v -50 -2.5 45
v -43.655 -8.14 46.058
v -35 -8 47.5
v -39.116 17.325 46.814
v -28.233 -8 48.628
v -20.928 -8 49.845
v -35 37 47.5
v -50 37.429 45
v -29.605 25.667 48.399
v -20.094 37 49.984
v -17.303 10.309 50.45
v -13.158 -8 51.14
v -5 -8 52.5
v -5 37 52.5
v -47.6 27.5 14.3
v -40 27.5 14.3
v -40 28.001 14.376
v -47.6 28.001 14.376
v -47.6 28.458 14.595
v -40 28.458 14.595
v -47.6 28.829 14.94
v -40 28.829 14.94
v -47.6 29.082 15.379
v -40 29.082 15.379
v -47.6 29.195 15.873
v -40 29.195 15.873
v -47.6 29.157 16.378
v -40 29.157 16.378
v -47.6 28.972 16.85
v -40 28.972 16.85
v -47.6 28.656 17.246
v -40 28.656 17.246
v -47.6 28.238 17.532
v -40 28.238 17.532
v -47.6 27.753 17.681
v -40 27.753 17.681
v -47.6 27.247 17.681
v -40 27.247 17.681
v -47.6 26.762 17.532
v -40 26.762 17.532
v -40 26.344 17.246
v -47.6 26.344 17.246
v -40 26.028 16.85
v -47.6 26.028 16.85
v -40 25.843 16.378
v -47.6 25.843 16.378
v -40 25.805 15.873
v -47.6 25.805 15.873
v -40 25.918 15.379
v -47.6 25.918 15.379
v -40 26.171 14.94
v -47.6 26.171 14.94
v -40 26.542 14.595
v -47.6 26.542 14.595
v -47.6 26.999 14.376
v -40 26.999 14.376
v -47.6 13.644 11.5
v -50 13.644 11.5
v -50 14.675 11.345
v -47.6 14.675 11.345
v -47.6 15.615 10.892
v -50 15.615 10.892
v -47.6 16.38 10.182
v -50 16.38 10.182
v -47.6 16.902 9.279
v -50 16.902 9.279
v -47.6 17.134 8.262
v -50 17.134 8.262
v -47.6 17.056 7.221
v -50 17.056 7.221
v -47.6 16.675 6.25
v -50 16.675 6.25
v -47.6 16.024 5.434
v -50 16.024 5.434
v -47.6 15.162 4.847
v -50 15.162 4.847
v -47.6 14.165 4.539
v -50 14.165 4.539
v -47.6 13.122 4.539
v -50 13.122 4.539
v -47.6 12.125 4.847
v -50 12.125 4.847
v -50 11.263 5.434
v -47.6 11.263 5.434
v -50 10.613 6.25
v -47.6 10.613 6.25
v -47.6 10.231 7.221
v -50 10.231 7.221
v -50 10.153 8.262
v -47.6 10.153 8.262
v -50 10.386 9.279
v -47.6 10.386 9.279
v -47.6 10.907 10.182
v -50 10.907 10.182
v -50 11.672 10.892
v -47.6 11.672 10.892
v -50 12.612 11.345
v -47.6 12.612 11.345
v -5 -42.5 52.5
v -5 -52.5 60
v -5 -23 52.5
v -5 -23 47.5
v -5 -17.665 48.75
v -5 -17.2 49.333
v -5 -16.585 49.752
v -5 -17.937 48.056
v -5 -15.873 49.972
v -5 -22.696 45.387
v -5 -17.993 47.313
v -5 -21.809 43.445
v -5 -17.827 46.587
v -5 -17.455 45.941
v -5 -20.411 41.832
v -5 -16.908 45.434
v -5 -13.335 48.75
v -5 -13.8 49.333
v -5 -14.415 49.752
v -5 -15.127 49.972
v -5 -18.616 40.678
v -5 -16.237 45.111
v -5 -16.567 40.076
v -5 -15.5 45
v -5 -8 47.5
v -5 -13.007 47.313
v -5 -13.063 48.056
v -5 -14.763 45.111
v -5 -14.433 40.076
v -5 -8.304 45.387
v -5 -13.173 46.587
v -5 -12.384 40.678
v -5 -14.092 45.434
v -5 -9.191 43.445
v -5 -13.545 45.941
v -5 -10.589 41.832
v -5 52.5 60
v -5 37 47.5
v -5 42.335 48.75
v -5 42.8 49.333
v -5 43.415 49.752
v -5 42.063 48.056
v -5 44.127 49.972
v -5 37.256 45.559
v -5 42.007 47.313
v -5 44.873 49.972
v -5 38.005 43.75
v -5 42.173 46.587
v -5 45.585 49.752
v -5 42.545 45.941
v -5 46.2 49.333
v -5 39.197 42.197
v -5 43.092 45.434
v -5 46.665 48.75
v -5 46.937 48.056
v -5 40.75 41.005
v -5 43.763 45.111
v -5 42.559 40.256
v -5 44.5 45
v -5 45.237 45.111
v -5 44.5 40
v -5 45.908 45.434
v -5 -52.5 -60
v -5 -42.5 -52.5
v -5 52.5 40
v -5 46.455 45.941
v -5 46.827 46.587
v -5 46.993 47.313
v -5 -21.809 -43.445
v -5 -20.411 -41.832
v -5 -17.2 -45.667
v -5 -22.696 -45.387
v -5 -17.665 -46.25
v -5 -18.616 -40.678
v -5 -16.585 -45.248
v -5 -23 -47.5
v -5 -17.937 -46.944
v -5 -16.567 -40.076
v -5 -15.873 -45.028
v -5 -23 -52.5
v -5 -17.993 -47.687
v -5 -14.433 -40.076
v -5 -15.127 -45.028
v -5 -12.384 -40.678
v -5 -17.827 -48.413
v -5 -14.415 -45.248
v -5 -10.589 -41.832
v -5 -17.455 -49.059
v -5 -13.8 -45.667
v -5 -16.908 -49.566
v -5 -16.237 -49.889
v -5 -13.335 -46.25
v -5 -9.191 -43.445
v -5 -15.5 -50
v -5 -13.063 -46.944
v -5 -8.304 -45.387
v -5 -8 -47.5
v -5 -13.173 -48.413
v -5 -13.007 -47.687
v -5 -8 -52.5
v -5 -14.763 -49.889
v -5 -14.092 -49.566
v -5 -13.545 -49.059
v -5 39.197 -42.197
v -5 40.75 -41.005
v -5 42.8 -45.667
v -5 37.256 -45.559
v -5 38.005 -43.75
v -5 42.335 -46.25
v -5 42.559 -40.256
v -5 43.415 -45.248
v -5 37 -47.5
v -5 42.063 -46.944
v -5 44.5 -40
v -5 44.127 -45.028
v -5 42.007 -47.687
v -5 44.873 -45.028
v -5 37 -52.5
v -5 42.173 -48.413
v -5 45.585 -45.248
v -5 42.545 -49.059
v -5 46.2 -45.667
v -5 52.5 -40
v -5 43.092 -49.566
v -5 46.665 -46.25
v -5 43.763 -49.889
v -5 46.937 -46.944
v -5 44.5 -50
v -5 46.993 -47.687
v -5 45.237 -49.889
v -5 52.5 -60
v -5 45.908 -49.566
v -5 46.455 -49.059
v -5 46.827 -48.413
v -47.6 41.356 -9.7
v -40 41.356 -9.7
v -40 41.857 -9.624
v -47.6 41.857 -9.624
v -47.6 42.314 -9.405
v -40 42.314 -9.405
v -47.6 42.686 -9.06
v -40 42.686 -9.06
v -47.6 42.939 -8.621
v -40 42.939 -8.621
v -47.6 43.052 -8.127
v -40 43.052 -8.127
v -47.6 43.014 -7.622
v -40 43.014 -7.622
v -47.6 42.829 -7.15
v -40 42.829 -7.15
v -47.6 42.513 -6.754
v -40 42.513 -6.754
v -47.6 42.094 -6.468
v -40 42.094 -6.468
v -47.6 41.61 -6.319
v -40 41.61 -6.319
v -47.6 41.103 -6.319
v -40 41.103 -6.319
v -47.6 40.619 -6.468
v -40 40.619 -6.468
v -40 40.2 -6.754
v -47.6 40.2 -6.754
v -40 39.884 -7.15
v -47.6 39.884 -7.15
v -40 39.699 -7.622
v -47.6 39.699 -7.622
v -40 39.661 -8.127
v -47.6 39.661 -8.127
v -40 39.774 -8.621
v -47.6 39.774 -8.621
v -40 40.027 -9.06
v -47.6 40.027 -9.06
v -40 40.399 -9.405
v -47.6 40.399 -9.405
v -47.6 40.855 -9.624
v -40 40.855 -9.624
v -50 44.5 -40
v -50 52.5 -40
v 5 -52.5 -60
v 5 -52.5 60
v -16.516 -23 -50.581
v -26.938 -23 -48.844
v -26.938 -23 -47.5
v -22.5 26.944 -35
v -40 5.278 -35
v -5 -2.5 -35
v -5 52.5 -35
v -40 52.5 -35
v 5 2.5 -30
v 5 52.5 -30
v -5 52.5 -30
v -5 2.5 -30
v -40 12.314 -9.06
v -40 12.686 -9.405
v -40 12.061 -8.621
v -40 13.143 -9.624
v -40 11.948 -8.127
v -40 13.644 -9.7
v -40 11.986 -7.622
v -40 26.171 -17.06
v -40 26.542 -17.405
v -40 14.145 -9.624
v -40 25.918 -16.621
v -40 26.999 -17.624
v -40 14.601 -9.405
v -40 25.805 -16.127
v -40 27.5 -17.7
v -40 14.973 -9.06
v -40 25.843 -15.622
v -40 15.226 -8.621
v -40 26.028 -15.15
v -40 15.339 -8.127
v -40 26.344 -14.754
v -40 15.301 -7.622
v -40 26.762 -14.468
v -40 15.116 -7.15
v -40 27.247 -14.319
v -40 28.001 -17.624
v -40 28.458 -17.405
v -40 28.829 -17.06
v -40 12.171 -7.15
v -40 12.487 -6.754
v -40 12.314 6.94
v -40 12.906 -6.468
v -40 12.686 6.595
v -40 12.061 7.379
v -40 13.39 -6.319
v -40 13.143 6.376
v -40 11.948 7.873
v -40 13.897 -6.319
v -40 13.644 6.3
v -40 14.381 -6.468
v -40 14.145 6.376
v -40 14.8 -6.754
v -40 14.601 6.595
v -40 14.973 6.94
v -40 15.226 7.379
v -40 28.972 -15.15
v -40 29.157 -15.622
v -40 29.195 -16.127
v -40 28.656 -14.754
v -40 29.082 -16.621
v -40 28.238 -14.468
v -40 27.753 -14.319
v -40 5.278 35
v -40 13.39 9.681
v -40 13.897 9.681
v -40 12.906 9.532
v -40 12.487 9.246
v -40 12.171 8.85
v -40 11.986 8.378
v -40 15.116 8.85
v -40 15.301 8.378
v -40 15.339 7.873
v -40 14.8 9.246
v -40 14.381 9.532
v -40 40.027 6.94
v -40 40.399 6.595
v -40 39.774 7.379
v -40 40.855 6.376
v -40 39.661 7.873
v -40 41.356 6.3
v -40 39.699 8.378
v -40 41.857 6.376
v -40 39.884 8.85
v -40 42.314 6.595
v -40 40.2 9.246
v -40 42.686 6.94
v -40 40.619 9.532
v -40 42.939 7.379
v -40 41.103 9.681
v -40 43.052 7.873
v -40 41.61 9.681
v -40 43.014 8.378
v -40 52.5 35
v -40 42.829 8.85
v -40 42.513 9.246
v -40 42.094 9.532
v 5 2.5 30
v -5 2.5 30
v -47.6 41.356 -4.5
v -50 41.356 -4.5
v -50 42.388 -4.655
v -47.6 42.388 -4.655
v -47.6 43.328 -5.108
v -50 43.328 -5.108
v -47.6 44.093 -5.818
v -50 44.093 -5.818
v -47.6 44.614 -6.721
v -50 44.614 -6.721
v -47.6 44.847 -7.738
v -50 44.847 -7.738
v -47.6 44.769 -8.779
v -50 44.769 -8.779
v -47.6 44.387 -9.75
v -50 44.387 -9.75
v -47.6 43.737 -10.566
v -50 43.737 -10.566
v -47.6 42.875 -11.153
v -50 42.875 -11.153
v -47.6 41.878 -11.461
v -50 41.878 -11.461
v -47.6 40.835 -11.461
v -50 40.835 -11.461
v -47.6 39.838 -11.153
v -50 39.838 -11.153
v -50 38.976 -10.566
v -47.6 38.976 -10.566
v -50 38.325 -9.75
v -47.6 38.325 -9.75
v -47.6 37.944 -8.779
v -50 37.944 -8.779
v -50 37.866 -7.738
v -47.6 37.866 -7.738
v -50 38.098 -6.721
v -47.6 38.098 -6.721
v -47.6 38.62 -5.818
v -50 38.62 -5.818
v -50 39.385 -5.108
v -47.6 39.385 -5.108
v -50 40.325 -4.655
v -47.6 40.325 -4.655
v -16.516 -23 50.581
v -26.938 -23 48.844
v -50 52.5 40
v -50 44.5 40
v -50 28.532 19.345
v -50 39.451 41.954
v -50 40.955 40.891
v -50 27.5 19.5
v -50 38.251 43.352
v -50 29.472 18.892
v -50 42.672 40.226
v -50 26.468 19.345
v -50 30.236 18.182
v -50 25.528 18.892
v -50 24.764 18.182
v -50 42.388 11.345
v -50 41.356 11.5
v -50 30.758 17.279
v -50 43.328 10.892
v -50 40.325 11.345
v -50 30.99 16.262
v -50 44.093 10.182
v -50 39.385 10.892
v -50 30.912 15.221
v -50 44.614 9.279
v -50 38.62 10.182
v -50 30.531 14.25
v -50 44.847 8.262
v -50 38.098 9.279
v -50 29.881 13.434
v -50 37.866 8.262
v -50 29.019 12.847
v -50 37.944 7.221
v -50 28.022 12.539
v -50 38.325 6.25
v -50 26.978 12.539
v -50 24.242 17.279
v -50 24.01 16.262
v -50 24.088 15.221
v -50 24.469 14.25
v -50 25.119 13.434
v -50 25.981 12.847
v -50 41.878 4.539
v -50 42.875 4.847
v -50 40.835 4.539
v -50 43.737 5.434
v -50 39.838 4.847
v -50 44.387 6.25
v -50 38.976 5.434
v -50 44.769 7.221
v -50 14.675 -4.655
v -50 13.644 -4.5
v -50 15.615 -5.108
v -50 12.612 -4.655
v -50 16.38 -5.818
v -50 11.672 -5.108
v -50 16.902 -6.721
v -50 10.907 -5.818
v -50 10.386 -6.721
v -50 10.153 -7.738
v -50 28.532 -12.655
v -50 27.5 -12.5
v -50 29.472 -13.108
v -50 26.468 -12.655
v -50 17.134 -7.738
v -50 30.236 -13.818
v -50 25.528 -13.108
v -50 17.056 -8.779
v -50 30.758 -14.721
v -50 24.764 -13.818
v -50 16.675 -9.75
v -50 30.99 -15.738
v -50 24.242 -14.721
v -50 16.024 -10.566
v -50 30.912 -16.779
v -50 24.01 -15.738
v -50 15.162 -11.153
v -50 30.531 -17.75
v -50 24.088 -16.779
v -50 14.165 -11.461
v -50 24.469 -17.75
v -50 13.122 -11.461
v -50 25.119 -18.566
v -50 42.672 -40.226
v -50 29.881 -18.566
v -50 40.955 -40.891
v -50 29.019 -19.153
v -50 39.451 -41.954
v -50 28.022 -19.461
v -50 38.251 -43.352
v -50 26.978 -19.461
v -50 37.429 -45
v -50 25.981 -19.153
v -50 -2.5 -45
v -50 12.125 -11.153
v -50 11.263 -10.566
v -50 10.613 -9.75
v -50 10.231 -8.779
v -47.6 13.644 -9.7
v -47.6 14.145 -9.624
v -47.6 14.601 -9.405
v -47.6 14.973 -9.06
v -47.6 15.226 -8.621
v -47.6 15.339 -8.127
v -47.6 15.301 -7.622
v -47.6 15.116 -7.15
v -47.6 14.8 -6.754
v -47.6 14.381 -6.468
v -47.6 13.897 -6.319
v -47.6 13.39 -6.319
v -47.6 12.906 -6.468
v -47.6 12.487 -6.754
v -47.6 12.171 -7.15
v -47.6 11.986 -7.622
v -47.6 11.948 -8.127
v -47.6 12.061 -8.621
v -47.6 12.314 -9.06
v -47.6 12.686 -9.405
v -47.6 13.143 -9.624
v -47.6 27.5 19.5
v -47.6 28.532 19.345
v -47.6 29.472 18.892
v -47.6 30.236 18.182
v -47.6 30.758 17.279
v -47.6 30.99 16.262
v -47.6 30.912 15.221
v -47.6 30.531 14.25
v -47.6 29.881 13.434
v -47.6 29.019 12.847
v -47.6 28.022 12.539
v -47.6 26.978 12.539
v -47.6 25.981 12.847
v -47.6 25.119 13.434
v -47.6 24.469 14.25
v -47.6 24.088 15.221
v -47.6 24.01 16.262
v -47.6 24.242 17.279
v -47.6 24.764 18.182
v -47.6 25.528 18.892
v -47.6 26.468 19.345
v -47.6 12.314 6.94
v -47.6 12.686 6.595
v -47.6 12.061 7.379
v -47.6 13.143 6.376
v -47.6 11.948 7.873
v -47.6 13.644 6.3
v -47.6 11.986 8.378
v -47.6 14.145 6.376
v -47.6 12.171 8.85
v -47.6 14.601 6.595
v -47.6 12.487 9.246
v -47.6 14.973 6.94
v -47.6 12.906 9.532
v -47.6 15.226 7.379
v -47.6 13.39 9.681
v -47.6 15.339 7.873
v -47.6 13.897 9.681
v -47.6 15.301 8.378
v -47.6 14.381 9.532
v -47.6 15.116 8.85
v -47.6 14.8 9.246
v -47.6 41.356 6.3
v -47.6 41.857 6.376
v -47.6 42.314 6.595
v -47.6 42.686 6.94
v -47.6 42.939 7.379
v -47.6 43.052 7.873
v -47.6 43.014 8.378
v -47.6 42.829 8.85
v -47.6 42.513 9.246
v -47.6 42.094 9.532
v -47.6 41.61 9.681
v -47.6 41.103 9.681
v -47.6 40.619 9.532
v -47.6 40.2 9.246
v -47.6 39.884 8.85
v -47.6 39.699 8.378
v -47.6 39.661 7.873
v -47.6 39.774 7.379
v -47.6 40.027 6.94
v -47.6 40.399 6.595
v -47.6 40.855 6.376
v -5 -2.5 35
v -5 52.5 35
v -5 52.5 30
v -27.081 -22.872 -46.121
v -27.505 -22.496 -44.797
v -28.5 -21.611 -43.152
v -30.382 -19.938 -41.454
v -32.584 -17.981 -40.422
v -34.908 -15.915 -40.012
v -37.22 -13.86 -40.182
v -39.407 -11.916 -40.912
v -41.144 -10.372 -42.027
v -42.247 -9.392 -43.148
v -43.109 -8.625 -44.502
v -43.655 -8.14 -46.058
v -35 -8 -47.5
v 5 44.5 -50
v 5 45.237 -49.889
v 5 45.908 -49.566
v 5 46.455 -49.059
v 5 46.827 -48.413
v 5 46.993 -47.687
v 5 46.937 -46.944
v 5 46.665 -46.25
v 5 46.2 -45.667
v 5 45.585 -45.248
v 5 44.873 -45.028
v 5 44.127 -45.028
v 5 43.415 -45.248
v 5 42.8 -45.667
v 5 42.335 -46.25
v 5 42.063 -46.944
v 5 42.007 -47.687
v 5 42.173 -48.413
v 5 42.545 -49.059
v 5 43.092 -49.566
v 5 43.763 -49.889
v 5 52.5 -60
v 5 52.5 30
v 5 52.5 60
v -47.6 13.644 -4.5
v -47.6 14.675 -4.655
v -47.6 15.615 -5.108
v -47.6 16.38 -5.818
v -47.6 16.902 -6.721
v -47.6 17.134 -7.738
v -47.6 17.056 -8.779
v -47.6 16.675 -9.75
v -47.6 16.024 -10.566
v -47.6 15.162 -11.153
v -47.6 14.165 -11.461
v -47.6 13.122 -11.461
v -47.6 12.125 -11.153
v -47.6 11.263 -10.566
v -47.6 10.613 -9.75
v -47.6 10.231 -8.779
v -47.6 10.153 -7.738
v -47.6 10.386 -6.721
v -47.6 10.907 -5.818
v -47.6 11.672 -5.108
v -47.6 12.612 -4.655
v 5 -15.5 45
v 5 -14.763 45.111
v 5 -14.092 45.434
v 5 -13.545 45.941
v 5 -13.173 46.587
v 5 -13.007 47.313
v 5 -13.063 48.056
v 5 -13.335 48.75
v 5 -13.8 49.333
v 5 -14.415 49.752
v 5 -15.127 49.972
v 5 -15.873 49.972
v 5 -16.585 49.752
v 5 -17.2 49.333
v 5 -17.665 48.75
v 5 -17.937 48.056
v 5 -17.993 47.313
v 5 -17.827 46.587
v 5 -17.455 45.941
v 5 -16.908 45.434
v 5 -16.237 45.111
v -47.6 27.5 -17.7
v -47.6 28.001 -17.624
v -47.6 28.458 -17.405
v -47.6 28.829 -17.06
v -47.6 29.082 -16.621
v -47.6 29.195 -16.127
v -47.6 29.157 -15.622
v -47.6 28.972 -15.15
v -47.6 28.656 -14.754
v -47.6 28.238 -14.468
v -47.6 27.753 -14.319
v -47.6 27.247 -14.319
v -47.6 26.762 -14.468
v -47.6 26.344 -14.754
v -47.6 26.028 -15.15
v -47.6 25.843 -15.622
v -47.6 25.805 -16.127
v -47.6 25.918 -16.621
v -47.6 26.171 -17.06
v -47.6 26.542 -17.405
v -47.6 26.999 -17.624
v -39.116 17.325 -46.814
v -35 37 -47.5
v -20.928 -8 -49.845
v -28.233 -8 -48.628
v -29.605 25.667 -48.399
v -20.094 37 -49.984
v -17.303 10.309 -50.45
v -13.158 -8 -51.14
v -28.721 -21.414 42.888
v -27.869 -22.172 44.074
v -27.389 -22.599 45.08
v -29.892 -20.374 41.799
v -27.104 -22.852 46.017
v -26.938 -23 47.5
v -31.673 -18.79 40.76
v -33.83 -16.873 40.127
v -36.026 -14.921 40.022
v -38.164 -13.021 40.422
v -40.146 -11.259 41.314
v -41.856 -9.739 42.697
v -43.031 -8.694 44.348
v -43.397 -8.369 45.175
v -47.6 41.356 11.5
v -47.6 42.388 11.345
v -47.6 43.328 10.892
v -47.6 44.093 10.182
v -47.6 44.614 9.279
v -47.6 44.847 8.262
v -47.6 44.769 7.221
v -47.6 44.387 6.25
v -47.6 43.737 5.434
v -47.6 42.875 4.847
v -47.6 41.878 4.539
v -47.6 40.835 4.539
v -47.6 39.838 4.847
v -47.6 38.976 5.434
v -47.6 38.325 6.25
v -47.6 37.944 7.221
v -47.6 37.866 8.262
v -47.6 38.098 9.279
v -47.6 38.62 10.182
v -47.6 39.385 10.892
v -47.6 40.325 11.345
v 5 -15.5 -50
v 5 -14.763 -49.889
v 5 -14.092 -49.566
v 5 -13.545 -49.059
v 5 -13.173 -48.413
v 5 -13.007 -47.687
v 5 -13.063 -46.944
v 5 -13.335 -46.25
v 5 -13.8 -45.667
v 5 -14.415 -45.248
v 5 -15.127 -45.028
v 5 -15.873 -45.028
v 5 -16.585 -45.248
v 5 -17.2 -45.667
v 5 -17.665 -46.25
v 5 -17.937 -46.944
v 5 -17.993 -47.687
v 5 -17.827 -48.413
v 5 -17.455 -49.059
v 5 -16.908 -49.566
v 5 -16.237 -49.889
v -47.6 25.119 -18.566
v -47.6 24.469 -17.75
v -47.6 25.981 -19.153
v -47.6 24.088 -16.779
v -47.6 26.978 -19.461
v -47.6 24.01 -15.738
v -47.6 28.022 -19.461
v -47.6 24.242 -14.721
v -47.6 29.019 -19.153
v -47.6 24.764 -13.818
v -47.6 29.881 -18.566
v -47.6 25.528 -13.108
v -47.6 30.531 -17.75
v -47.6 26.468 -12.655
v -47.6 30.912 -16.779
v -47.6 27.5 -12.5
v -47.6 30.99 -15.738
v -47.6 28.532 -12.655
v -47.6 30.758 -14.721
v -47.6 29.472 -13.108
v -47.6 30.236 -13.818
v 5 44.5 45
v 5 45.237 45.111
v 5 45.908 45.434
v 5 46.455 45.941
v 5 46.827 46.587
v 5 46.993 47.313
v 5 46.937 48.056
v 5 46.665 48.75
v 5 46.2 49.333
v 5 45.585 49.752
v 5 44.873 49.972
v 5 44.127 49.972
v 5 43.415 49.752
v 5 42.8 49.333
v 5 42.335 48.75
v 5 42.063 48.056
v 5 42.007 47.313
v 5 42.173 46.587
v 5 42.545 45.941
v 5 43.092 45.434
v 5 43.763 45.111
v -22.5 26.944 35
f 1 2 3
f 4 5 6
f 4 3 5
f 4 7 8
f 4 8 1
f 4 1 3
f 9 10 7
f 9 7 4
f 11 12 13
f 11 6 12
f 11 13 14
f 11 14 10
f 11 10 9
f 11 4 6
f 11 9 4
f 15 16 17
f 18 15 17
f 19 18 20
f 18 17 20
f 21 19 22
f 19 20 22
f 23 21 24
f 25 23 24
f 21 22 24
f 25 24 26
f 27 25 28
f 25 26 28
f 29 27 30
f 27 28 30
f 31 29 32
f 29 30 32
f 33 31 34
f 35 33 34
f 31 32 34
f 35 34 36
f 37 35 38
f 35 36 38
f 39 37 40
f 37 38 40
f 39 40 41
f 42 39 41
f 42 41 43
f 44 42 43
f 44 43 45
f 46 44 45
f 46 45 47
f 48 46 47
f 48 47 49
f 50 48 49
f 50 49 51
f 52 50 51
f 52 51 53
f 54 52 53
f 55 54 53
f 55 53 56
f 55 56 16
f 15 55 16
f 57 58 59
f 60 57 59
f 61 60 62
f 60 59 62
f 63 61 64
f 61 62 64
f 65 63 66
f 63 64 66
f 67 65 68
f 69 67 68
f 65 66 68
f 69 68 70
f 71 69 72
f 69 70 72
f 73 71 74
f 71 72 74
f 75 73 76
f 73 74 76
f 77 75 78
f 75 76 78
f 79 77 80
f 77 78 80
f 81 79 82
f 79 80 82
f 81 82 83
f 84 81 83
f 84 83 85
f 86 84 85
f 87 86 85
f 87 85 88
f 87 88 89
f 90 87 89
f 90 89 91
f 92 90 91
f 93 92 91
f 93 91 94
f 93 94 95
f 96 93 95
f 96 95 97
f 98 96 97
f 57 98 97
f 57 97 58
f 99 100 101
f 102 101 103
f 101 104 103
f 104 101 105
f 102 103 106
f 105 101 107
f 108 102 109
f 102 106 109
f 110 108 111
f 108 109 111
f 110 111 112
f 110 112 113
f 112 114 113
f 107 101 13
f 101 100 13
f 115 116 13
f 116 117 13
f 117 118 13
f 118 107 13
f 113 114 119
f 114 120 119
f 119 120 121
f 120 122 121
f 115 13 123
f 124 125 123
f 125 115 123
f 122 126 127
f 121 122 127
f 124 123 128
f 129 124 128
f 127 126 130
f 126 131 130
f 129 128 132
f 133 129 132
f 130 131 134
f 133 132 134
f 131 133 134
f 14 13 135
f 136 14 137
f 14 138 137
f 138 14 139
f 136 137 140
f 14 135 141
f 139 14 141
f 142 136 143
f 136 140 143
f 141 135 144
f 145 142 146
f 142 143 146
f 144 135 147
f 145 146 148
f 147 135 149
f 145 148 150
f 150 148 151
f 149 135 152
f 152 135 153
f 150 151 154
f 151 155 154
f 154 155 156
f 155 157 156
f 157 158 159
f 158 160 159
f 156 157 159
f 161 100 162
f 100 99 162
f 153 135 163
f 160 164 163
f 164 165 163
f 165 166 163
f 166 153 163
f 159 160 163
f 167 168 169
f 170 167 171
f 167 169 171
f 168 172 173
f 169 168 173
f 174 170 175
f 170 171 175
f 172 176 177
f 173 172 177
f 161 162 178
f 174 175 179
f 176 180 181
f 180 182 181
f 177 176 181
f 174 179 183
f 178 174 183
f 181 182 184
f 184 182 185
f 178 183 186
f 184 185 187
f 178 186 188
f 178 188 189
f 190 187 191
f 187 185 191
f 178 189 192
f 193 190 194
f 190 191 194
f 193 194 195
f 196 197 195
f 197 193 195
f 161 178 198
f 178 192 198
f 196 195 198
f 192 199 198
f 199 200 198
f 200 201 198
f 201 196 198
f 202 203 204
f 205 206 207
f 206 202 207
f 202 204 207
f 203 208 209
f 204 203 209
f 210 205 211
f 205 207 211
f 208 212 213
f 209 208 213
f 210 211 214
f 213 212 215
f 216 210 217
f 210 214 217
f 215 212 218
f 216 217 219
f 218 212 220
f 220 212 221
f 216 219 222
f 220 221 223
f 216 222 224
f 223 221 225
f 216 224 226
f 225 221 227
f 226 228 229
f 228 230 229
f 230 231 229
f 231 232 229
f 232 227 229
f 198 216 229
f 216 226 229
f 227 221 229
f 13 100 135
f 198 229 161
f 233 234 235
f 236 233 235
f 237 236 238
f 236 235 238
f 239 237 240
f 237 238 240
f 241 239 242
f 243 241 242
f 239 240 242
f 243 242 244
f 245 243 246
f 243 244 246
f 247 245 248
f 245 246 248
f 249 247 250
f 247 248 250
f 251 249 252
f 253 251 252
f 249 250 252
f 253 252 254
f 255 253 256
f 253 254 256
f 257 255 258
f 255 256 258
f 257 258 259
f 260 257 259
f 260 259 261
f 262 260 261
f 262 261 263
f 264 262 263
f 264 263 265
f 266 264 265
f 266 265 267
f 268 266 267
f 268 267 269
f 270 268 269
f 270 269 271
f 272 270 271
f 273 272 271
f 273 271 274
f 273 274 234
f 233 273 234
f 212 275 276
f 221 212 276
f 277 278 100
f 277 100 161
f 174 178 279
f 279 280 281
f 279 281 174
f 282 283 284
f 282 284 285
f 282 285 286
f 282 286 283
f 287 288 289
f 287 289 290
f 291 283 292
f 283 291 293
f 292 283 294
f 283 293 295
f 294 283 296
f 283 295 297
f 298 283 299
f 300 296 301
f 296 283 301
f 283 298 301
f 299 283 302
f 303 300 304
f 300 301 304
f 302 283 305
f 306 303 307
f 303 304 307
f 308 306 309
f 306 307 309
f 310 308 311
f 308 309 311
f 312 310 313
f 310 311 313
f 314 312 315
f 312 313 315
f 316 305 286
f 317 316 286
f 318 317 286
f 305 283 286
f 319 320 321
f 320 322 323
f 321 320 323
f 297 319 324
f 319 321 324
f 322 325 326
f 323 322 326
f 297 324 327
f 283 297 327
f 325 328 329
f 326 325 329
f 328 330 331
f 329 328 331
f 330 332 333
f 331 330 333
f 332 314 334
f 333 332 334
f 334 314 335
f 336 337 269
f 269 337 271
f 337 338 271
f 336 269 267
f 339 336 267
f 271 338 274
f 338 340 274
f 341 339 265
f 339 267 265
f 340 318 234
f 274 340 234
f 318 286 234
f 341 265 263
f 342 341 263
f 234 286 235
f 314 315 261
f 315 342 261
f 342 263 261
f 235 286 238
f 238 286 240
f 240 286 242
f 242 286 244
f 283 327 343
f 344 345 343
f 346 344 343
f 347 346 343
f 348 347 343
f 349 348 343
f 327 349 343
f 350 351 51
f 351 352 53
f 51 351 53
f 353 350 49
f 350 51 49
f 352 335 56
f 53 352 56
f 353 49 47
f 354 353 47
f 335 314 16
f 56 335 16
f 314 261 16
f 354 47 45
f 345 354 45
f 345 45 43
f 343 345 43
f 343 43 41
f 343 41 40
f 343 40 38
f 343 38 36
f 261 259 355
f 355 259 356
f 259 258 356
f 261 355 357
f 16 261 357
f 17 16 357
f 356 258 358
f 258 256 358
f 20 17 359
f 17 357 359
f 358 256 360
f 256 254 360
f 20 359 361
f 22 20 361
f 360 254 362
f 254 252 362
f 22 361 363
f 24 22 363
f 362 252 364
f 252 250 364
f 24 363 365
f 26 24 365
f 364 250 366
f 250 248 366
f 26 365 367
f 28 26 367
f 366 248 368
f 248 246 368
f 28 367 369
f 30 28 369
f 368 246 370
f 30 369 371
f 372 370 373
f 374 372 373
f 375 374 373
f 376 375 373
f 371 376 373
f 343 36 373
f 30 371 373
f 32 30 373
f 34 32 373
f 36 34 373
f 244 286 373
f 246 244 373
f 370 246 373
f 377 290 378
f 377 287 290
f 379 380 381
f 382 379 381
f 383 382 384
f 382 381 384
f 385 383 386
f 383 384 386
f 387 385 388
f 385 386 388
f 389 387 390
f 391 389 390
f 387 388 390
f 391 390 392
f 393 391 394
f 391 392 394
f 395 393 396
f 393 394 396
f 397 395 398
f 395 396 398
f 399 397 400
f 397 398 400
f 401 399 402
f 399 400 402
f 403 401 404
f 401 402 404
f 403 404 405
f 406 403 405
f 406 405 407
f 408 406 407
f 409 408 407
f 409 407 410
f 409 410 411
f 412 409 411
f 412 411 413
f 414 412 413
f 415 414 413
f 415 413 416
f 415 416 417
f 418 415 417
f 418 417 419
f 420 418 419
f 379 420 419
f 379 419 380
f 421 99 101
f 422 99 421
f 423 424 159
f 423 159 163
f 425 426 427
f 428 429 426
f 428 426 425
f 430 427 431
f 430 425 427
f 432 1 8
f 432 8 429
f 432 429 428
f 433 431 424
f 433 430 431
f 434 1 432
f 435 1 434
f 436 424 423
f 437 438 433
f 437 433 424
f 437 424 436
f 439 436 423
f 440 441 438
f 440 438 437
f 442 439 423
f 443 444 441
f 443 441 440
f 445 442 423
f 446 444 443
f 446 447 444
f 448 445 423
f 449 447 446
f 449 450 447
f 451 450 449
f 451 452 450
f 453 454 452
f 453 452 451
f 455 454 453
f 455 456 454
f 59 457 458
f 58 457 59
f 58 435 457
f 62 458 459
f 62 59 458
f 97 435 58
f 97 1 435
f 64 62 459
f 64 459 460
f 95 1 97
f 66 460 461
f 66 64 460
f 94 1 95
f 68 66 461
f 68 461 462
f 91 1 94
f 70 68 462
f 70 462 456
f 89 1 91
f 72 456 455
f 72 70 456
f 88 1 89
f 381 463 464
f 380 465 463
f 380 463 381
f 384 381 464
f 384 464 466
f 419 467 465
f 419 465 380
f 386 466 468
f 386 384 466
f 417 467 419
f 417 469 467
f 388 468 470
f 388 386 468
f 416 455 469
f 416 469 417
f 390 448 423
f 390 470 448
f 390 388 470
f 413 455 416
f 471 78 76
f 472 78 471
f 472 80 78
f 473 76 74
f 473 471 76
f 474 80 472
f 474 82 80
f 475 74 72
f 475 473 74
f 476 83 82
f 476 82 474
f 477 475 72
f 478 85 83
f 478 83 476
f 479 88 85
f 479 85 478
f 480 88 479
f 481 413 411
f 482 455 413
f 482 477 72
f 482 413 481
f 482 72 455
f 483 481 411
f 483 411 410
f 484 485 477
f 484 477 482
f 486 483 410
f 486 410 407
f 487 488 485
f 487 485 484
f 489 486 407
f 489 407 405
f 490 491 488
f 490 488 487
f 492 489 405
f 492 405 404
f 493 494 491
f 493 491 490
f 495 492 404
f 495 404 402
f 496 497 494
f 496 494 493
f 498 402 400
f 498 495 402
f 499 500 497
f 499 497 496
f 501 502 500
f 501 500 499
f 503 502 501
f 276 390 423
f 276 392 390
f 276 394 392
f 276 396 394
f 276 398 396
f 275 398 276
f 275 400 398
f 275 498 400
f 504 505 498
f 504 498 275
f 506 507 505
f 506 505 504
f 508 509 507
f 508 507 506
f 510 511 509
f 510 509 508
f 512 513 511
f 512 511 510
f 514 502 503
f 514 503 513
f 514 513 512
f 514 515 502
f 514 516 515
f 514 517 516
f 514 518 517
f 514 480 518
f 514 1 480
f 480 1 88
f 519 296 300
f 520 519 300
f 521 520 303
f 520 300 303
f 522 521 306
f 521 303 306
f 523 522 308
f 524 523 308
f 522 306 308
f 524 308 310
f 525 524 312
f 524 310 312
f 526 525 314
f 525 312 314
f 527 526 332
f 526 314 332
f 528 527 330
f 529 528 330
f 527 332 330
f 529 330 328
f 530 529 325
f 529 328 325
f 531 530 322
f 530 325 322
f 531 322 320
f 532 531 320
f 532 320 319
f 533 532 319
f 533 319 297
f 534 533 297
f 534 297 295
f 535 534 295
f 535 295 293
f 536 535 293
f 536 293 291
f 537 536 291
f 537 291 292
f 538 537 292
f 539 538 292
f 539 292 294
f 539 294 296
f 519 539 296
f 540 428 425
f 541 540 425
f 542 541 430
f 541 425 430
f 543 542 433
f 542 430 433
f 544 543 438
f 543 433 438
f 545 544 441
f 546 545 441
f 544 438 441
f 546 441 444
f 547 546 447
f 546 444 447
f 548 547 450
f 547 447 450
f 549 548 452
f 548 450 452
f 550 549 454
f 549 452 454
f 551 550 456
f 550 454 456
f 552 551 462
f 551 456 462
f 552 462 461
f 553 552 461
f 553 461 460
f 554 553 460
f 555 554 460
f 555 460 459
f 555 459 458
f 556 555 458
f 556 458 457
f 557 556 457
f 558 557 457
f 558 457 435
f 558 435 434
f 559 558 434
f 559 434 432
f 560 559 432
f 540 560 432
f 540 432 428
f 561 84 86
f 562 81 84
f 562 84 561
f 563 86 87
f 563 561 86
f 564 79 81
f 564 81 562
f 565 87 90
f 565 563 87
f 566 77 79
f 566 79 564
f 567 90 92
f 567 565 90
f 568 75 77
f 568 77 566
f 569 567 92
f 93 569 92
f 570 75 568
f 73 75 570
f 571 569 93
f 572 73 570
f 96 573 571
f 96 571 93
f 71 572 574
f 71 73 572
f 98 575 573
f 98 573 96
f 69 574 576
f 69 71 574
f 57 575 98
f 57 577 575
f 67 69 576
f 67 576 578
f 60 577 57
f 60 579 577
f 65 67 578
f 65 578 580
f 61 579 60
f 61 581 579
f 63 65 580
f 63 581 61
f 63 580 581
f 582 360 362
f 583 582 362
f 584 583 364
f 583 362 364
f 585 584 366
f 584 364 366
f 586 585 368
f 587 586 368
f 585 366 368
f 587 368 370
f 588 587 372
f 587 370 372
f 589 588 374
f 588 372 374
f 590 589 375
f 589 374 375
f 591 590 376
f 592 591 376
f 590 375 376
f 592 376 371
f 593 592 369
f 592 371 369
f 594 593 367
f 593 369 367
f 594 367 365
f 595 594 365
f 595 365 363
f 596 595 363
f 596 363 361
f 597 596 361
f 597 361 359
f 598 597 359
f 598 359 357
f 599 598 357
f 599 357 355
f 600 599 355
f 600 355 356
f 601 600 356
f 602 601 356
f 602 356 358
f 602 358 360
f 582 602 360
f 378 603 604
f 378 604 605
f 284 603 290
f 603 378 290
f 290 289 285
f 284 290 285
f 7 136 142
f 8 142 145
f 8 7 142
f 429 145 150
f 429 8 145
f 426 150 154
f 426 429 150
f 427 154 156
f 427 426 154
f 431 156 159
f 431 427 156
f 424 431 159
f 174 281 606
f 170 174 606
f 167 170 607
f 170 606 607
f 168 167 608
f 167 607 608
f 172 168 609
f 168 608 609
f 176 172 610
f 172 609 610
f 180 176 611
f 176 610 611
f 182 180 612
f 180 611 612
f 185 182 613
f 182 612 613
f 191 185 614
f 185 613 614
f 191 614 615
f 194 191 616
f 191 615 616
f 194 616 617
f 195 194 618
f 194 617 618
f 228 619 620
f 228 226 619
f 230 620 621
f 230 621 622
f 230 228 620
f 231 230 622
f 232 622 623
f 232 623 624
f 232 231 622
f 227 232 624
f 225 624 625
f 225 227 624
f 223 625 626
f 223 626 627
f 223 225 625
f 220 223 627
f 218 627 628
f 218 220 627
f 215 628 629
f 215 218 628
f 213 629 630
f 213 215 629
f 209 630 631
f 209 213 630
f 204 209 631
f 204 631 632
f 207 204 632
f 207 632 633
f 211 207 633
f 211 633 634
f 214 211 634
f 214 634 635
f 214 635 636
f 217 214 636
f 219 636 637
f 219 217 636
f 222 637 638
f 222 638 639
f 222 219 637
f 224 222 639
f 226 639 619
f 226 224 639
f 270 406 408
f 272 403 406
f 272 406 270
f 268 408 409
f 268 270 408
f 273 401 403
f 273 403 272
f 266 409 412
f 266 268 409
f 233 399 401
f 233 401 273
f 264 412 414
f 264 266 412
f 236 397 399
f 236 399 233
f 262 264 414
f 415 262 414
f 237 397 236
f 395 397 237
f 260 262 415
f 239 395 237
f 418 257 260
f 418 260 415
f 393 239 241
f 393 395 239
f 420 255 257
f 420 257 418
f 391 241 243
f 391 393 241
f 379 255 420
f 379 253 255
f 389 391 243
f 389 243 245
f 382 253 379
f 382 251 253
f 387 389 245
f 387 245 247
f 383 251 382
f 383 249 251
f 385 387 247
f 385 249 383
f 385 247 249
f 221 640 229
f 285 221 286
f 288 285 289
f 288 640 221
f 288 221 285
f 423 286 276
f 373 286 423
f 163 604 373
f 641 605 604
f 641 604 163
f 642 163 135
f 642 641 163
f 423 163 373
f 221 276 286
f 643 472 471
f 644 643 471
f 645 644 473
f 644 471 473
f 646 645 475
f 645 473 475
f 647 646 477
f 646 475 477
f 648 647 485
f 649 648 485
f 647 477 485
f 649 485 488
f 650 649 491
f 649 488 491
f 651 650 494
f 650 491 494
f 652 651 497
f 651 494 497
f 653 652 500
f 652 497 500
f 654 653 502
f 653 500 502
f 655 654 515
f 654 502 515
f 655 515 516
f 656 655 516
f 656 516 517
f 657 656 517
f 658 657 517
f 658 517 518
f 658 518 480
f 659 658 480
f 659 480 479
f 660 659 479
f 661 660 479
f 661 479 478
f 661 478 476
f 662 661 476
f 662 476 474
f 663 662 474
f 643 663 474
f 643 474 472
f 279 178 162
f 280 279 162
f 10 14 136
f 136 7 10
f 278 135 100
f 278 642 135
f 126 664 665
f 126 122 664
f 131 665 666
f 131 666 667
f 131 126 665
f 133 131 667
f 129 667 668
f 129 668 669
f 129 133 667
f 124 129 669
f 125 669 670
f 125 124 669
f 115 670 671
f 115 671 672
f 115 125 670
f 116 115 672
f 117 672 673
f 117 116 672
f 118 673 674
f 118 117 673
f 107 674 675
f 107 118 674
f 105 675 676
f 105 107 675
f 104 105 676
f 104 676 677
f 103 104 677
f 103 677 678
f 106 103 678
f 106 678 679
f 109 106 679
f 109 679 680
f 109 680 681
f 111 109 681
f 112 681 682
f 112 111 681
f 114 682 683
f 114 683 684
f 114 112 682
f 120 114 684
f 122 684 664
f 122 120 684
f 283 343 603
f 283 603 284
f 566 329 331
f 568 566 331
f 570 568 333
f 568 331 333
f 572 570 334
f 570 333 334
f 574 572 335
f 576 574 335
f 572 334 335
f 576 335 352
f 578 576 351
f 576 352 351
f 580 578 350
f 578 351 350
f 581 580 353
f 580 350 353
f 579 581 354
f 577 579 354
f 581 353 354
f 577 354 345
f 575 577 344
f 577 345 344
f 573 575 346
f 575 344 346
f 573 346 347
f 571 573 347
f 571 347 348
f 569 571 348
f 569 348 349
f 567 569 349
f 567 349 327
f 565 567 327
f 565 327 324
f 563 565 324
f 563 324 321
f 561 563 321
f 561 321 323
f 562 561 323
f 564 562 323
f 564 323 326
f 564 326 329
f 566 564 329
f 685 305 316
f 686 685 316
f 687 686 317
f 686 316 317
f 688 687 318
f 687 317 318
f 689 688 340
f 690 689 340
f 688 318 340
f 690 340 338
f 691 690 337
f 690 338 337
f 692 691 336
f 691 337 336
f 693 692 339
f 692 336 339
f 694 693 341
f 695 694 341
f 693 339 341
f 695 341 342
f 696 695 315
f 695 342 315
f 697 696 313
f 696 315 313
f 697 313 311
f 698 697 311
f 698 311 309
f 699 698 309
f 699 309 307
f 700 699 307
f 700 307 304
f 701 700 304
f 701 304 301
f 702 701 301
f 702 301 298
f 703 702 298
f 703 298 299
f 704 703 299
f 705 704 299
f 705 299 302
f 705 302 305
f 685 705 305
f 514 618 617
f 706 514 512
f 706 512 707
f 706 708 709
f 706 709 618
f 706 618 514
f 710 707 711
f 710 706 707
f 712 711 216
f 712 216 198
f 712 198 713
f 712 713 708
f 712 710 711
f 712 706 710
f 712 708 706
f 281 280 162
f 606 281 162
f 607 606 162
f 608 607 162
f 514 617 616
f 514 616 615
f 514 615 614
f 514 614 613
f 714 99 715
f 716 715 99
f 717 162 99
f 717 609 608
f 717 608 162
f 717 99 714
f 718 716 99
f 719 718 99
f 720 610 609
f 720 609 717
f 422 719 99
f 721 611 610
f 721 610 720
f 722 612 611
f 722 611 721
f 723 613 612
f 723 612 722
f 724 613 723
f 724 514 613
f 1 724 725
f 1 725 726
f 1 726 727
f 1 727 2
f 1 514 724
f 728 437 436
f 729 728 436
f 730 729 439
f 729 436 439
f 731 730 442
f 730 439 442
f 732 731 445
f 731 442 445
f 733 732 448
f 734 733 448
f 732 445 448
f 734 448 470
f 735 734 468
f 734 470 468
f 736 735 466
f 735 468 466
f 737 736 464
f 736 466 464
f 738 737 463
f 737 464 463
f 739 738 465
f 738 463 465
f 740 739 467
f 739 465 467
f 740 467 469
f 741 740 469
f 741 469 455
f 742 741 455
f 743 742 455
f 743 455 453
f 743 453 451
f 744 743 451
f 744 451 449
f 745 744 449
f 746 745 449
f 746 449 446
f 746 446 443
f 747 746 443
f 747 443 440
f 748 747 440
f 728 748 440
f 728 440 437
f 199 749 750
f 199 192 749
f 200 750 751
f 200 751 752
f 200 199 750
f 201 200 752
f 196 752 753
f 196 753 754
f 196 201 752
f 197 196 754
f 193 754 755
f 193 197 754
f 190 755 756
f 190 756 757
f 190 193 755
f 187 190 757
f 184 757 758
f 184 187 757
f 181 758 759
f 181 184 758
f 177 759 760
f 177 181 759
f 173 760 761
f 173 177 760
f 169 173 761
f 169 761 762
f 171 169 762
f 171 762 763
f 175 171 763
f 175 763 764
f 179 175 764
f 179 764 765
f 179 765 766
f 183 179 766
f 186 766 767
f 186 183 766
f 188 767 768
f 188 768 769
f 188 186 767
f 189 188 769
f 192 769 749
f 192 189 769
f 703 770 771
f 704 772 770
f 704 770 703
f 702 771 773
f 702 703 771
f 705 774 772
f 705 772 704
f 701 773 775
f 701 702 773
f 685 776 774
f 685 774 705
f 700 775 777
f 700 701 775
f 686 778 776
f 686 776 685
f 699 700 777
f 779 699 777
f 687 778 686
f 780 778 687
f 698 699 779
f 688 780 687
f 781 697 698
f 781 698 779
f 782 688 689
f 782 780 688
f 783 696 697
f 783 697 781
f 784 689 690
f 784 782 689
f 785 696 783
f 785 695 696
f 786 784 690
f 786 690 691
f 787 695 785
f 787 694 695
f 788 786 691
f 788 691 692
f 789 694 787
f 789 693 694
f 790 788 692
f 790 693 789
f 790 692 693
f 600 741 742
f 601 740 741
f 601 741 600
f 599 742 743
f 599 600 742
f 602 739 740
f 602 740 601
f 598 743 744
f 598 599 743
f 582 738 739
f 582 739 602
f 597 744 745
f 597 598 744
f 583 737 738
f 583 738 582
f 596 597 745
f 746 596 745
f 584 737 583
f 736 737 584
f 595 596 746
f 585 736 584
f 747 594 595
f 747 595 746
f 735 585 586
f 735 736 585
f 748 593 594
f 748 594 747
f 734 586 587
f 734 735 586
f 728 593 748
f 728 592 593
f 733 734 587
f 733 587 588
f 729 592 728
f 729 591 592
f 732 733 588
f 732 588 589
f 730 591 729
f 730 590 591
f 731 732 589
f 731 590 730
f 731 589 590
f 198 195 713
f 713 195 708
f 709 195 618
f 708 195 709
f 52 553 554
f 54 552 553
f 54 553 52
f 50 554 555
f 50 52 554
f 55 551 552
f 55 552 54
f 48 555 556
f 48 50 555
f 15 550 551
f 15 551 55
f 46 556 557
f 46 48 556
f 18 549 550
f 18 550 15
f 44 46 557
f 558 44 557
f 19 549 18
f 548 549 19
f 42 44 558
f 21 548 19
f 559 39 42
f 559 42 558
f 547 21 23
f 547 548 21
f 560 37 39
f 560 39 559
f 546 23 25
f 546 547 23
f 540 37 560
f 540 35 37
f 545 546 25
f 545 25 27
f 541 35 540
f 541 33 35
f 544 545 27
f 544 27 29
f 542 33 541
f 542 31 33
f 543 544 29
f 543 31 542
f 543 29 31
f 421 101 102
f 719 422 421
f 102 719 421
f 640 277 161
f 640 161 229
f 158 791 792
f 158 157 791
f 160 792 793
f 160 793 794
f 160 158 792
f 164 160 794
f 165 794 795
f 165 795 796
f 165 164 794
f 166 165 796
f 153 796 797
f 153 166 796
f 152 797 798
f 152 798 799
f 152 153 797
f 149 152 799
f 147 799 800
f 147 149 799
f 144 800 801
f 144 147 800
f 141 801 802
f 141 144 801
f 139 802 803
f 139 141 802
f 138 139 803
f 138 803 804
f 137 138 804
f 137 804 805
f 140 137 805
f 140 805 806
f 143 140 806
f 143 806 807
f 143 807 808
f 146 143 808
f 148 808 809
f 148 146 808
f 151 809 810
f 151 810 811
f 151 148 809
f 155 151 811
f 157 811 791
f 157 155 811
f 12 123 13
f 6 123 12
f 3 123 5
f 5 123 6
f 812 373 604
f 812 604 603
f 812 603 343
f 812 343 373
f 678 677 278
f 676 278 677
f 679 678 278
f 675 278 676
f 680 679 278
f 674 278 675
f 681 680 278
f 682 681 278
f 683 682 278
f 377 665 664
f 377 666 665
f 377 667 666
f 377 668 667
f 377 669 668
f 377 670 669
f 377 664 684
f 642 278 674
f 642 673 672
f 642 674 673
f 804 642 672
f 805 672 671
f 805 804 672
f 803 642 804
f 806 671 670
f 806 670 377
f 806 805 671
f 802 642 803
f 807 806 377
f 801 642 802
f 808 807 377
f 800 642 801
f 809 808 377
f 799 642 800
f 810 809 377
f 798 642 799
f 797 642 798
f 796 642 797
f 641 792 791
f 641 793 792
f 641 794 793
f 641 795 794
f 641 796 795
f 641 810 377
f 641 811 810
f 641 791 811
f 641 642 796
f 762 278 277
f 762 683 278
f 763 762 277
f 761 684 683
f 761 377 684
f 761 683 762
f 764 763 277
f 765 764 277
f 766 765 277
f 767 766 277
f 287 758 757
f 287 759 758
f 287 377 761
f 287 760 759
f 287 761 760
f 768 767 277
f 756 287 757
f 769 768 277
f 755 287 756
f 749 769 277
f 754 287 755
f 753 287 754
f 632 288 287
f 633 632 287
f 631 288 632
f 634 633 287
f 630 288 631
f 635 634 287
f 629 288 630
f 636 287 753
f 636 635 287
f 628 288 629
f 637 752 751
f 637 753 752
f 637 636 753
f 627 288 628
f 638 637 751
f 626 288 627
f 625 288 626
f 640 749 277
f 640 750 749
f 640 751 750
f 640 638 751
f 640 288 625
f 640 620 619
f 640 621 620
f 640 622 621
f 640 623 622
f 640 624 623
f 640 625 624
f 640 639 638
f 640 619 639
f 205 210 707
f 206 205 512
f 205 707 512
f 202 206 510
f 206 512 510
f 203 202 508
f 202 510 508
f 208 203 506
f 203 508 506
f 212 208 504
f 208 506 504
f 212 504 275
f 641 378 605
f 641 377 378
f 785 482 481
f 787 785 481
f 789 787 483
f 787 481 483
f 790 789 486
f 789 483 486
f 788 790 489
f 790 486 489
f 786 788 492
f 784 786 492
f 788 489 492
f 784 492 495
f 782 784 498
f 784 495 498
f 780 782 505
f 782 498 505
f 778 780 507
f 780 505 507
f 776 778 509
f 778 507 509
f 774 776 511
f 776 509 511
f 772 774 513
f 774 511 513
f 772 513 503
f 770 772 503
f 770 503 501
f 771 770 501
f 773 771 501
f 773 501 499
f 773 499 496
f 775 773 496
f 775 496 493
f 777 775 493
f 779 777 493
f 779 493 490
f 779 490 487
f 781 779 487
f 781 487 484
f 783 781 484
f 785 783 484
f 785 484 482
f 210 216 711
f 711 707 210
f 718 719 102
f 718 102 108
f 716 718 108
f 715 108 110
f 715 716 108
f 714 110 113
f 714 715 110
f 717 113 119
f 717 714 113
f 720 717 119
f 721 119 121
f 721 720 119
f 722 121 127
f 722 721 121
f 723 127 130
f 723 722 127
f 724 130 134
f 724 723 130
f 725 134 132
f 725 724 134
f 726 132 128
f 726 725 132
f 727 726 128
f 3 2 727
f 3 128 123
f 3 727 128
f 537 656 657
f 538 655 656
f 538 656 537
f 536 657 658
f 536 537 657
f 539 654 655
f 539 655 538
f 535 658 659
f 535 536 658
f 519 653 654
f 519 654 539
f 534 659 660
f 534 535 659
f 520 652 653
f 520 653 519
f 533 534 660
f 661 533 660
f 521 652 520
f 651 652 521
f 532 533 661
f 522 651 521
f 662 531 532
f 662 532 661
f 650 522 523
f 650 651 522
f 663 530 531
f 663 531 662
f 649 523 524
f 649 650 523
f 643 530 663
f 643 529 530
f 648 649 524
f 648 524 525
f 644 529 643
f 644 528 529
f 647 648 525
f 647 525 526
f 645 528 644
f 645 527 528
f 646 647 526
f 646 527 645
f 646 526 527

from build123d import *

# Parameters (mm, degrees)
CROQUIS1_R                                           = 2.5
SALIENTE_EXTRUIR1_DEPTH                              = 5
CROQUIS9_W                                           = 90
CROQUIS9_H                                           = 55
SALIENTE_EXTRUIR2_DEPTH                              = 10
REFRENTADO_PARA_TORNILLO_CON_CABEZA_TRON_D           = 3.4
REFRENTADO_PARA_TORNILLO_CON_CABEZA_TRON_DEPTH       = 10
REFRENTADO_PARA_TORNILLO_CON_CABEZA_TRON_CBORE_D     = 7
REFRENTADO_PARA_TORNILLO_CON_CABEZA_TRON_CBORE_DEPTH = 2.4
CORTAR_EXTRUIR1_DEPTH                                = 45


with BuildPart() as part:
    # Croquis1 → Saliente-Extruir1 (new, symmetric)
    with BuildSketch(Plane(origin=(0, 0, 0), x_dir=(0, 0, -1), z_dir=(1, 0, 0))):
        Polygon((-60, 52.5), (-60, -52.5), (60, -52.5), (60, 52.5), (30, 52.5), (30, 2.5), (-30, 2.5), (-30, 52.5), align=None)
        with Locations((-47.5, -15.5)):
            Circle(CROQUIS1_R, mode=Mode.SUBTRACT)
        with Locations((47.5, -15.5)):
            Circle(CROQUIS1_R, mode=Mode.SUBTRACT)
        with Locations((-47.5, 44.5)):
            Circle(CROQUIS1_R, mode=Mode.SUBTRACT)
        with Locations((47.5, 44.5)):
            Circle(CROQUIS1_R, mode=Mode.SUBTRACT)
    extrude(amount=SALIENTE_EXTRUIR1_DEPTH, both=True)

    # Croquis7 → Recubrir3 section 0
    with BuildSketch(Plane.ZY.offset(5)):
        with BuildLine():
            Line((-52.5, -42.5), (52.5, -42.5))
            Line((52.5, -42.5), (52.5, 52.5))
            Line((52.5, 52.5), (35, 52.5))
            Line((35, 52.5), (35, -2.5))
            Line((35, -2.5), (-35, -2.5))
            Line((-35, -2.5), (-35, 52.5))
            Line((-35, 52.5), (-52.5, 52.5))
            Line((-52.5, 52.5), (-52.5, -42.5))
        make_face()
    # Croquis8 → Recubrir3 section 1
    with BuildSketch(Plane(origin=(-50, 0, 0), x_dir=(0, 0, -1), z_dir=(1, 0, 0))):
        with BuildLine():
            Line((-45, -2.5), (45, -2.5))
            Line((45, -2.5), (45, 52.5))
            Line((45, 52.5), (35, 52.5))
            Line((35, 52.5), (35, 7.5))
            Line((35, 7.5), (-35, 7.5))
            Line((-35, 7.5), (-35, 52.5))
            Line((-35, 52.5), (-45, 52.5))
            Line((-45, 52.5), (-45, -2.5))
        make_face()
    loft()

    # Croquis9 → Saliente-Extruir2 (add)
    with BuildSketch(Plane.ZY.offset(50)):
        with Locations((0, 25)):
            Rectangle(CROQUIS9_W, CROQUIS9_H)
    extrude(amount=-SALIENTE_EXTRUIR2_DEPTH)

    # Refrentado para tornillo con cabeza troncocónica de M34
    with Locations(Plane.ZY.offset(50)):
        with Locations((-8, 41.356406461), (8, 41.356406461), (16, 27.5), (8, 13.643593539), (-8, 13.643593539), (-16, 27.5), (-99.109009009, 35.557197268)):
            CounterBoreHole(REFRENTADO_PARA_TORNILLO_CON_CABEZA_TRON_D / 2, REFRENTADO_PARA_TORNILLO_CON_CABEZA_TRON_CBORE_D / 2, REFRENTADO_PARA_TORNILLO_CON_CABEZA_TRON_CBORE_DEPTH, depth=REFRENTADO_PARA_TORNILLO_CON_CABEZA_TRON_DEPTH)

    # Croquis12 → Cortar-Extruir1 (cut)
    with BuildSketch(Plane.ZY.offset(50)):
        with BuildLine():
            Line((-40, 44.5), (-40, 52.5))
            Line((-40, 52.5), (-55, 52.5))
            Line((-55, 52.5), (-55, 44.5))
            Line((-55, 44.5), (-55, 37))
            Line((-55, 37), (-47.5, 37))
            ThreePointArc((-47.5, 37), (-42.196699141, 39.196699141), (-40, 44.5))
        make_face()
        with BuildLine():
            Line((40, 44.5), (40, 52.5))
            Line((40, 52.5), (55, 52.5))
            Line((55, 52.5), (55, 44.5))
            Line((55, 44.5), (55, 37))
            Line((55, 37), (47.5, 37))
            ThreePointArc((47.5, 37), (42.196699141, 39.196699141), (40, 44.5))
        make_face()
        with BuildLine():
            Line((47.5, -8), (55, -8))
            Line((55, -8), (55, -15.5))
            Line((55, -15.5), (55, -23))
            Line((55, -23), (47.5, -23))
            ThreePointArc((47.5, -23), (40, -15.5), (47.5, -8))
        make_face()
        with BuildLine():
            Line((-47.5, -8), (-55, -8))
            Line((-55, -8), (-55, -15.5))
            Line((-55, -15.5), (-55, -23))
            Line((-55, -23), (-47.5, -23))
            ThreePointArc((-47.5, -23), (-40, -15.5), (-47.5, -8))
        make_face()
    extrude(amount=-CORTAR_EXTRUIR1_DEPTH, mode=Mode.SUBTRACT)


solid = part.part
